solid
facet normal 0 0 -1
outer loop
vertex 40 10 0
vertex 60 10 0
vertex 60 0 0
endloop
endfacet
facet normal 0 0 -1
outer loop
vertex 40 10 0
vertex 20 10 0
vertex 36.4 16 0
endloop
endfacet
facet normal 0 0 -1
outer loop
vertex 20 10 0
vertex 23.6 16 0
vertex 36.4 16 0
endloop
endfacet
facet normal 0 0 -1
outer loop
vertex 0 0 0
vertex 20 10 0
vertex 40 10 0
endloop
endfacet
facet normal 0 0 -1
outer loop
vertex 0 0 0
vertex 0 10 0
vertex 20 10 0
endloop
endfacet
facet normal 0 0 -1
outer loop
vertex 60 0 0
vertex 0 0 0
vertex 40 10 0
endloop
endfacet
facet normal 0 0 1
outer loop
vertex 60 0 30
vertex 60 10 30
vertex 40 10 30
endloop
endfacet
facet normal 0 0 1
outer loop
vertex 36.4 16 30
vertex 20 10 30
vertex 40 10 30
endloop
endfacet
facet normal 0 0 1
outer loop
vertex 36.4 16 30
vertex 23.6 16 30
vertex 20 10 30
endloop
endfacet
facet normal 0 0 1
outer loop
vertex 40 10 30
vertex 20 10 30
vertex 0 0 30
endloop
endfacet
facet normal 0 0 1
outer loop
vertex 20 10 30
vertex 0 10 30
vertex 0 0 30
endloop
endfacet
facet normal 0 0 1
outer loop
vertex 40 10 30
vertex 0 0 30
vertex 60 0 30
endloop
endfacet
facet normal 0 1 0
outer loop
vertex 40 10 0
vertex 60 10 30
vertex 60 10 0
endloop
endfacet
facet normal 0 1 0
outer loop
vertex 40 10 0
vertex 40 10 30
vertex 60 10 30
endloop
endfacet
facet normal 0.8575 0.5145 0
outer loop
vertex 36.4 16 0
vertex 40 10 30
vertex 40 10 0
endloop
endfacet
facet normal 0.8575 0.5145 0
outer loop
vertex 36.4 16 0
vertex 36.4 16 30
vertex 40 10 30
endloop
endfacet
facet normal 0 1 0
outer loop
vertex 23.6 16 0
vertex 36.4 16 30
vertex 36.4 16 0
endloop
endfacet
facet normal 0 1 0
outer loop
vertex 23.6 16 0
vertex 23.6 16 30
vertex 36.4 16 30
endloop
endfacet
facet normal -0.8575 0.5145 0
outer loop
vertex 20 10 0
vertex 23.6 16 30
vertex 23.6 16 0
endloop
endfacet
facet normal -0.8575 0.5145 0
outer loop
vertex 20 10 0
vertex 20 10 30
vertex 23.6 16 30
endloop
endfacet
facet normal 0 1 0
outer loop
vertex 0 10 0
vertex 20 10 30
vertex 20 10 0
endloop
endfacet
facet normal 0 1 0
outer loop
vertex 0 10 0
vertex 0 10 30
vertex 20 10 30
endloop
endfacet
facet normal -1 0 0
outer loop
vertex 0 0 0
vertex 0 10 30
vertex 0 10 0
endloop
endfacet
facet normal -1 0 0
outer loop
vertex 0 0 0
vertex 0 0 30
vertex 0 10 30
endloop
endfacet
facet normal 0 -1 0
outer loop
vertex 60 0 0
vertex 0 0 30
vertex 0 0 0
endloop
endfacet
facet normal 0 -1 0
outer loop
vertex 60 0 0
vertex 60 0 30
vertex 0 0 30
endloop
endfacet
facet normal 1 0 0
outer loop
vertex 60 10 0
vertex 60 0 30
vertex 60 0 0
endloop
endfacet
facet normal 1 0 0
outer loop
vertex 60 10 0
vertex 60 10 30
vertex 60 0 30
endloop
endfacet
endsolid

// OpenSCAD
$fn = 32;

// ----------------------------------------------------------------------
// V guide rail: dovetail, 60 mm wide
// ----------------------------------------------------------------------

// --- parameters (mm) ---
rail_w = 60;              // rail width, X
base_t = 10;              // base plate thickness
v_depth = 6;              // V feature depth / height
v_half_w = 10;            // half width of the V at the base face
plate_t = 30;             // rail length, Z (the extrusion height)
top_half_w = 6.4;         // half width at the dovetail top

dovetail_base = 2 * v_half_w;  // dovetail width at the base
dovetail_top = 2 * top_half_w;  // dovetail width at the top

profile = [[0, 0], [60, 0], [60, 10], [40, 10], [36.4, 16], [23.6, 16], [20, 10], [0, 10]];  // primary outline, 8 points, counter clockwise

// --- the one profile operation ---
linear_extrude(height = plate_t) polygon(points = profile);
